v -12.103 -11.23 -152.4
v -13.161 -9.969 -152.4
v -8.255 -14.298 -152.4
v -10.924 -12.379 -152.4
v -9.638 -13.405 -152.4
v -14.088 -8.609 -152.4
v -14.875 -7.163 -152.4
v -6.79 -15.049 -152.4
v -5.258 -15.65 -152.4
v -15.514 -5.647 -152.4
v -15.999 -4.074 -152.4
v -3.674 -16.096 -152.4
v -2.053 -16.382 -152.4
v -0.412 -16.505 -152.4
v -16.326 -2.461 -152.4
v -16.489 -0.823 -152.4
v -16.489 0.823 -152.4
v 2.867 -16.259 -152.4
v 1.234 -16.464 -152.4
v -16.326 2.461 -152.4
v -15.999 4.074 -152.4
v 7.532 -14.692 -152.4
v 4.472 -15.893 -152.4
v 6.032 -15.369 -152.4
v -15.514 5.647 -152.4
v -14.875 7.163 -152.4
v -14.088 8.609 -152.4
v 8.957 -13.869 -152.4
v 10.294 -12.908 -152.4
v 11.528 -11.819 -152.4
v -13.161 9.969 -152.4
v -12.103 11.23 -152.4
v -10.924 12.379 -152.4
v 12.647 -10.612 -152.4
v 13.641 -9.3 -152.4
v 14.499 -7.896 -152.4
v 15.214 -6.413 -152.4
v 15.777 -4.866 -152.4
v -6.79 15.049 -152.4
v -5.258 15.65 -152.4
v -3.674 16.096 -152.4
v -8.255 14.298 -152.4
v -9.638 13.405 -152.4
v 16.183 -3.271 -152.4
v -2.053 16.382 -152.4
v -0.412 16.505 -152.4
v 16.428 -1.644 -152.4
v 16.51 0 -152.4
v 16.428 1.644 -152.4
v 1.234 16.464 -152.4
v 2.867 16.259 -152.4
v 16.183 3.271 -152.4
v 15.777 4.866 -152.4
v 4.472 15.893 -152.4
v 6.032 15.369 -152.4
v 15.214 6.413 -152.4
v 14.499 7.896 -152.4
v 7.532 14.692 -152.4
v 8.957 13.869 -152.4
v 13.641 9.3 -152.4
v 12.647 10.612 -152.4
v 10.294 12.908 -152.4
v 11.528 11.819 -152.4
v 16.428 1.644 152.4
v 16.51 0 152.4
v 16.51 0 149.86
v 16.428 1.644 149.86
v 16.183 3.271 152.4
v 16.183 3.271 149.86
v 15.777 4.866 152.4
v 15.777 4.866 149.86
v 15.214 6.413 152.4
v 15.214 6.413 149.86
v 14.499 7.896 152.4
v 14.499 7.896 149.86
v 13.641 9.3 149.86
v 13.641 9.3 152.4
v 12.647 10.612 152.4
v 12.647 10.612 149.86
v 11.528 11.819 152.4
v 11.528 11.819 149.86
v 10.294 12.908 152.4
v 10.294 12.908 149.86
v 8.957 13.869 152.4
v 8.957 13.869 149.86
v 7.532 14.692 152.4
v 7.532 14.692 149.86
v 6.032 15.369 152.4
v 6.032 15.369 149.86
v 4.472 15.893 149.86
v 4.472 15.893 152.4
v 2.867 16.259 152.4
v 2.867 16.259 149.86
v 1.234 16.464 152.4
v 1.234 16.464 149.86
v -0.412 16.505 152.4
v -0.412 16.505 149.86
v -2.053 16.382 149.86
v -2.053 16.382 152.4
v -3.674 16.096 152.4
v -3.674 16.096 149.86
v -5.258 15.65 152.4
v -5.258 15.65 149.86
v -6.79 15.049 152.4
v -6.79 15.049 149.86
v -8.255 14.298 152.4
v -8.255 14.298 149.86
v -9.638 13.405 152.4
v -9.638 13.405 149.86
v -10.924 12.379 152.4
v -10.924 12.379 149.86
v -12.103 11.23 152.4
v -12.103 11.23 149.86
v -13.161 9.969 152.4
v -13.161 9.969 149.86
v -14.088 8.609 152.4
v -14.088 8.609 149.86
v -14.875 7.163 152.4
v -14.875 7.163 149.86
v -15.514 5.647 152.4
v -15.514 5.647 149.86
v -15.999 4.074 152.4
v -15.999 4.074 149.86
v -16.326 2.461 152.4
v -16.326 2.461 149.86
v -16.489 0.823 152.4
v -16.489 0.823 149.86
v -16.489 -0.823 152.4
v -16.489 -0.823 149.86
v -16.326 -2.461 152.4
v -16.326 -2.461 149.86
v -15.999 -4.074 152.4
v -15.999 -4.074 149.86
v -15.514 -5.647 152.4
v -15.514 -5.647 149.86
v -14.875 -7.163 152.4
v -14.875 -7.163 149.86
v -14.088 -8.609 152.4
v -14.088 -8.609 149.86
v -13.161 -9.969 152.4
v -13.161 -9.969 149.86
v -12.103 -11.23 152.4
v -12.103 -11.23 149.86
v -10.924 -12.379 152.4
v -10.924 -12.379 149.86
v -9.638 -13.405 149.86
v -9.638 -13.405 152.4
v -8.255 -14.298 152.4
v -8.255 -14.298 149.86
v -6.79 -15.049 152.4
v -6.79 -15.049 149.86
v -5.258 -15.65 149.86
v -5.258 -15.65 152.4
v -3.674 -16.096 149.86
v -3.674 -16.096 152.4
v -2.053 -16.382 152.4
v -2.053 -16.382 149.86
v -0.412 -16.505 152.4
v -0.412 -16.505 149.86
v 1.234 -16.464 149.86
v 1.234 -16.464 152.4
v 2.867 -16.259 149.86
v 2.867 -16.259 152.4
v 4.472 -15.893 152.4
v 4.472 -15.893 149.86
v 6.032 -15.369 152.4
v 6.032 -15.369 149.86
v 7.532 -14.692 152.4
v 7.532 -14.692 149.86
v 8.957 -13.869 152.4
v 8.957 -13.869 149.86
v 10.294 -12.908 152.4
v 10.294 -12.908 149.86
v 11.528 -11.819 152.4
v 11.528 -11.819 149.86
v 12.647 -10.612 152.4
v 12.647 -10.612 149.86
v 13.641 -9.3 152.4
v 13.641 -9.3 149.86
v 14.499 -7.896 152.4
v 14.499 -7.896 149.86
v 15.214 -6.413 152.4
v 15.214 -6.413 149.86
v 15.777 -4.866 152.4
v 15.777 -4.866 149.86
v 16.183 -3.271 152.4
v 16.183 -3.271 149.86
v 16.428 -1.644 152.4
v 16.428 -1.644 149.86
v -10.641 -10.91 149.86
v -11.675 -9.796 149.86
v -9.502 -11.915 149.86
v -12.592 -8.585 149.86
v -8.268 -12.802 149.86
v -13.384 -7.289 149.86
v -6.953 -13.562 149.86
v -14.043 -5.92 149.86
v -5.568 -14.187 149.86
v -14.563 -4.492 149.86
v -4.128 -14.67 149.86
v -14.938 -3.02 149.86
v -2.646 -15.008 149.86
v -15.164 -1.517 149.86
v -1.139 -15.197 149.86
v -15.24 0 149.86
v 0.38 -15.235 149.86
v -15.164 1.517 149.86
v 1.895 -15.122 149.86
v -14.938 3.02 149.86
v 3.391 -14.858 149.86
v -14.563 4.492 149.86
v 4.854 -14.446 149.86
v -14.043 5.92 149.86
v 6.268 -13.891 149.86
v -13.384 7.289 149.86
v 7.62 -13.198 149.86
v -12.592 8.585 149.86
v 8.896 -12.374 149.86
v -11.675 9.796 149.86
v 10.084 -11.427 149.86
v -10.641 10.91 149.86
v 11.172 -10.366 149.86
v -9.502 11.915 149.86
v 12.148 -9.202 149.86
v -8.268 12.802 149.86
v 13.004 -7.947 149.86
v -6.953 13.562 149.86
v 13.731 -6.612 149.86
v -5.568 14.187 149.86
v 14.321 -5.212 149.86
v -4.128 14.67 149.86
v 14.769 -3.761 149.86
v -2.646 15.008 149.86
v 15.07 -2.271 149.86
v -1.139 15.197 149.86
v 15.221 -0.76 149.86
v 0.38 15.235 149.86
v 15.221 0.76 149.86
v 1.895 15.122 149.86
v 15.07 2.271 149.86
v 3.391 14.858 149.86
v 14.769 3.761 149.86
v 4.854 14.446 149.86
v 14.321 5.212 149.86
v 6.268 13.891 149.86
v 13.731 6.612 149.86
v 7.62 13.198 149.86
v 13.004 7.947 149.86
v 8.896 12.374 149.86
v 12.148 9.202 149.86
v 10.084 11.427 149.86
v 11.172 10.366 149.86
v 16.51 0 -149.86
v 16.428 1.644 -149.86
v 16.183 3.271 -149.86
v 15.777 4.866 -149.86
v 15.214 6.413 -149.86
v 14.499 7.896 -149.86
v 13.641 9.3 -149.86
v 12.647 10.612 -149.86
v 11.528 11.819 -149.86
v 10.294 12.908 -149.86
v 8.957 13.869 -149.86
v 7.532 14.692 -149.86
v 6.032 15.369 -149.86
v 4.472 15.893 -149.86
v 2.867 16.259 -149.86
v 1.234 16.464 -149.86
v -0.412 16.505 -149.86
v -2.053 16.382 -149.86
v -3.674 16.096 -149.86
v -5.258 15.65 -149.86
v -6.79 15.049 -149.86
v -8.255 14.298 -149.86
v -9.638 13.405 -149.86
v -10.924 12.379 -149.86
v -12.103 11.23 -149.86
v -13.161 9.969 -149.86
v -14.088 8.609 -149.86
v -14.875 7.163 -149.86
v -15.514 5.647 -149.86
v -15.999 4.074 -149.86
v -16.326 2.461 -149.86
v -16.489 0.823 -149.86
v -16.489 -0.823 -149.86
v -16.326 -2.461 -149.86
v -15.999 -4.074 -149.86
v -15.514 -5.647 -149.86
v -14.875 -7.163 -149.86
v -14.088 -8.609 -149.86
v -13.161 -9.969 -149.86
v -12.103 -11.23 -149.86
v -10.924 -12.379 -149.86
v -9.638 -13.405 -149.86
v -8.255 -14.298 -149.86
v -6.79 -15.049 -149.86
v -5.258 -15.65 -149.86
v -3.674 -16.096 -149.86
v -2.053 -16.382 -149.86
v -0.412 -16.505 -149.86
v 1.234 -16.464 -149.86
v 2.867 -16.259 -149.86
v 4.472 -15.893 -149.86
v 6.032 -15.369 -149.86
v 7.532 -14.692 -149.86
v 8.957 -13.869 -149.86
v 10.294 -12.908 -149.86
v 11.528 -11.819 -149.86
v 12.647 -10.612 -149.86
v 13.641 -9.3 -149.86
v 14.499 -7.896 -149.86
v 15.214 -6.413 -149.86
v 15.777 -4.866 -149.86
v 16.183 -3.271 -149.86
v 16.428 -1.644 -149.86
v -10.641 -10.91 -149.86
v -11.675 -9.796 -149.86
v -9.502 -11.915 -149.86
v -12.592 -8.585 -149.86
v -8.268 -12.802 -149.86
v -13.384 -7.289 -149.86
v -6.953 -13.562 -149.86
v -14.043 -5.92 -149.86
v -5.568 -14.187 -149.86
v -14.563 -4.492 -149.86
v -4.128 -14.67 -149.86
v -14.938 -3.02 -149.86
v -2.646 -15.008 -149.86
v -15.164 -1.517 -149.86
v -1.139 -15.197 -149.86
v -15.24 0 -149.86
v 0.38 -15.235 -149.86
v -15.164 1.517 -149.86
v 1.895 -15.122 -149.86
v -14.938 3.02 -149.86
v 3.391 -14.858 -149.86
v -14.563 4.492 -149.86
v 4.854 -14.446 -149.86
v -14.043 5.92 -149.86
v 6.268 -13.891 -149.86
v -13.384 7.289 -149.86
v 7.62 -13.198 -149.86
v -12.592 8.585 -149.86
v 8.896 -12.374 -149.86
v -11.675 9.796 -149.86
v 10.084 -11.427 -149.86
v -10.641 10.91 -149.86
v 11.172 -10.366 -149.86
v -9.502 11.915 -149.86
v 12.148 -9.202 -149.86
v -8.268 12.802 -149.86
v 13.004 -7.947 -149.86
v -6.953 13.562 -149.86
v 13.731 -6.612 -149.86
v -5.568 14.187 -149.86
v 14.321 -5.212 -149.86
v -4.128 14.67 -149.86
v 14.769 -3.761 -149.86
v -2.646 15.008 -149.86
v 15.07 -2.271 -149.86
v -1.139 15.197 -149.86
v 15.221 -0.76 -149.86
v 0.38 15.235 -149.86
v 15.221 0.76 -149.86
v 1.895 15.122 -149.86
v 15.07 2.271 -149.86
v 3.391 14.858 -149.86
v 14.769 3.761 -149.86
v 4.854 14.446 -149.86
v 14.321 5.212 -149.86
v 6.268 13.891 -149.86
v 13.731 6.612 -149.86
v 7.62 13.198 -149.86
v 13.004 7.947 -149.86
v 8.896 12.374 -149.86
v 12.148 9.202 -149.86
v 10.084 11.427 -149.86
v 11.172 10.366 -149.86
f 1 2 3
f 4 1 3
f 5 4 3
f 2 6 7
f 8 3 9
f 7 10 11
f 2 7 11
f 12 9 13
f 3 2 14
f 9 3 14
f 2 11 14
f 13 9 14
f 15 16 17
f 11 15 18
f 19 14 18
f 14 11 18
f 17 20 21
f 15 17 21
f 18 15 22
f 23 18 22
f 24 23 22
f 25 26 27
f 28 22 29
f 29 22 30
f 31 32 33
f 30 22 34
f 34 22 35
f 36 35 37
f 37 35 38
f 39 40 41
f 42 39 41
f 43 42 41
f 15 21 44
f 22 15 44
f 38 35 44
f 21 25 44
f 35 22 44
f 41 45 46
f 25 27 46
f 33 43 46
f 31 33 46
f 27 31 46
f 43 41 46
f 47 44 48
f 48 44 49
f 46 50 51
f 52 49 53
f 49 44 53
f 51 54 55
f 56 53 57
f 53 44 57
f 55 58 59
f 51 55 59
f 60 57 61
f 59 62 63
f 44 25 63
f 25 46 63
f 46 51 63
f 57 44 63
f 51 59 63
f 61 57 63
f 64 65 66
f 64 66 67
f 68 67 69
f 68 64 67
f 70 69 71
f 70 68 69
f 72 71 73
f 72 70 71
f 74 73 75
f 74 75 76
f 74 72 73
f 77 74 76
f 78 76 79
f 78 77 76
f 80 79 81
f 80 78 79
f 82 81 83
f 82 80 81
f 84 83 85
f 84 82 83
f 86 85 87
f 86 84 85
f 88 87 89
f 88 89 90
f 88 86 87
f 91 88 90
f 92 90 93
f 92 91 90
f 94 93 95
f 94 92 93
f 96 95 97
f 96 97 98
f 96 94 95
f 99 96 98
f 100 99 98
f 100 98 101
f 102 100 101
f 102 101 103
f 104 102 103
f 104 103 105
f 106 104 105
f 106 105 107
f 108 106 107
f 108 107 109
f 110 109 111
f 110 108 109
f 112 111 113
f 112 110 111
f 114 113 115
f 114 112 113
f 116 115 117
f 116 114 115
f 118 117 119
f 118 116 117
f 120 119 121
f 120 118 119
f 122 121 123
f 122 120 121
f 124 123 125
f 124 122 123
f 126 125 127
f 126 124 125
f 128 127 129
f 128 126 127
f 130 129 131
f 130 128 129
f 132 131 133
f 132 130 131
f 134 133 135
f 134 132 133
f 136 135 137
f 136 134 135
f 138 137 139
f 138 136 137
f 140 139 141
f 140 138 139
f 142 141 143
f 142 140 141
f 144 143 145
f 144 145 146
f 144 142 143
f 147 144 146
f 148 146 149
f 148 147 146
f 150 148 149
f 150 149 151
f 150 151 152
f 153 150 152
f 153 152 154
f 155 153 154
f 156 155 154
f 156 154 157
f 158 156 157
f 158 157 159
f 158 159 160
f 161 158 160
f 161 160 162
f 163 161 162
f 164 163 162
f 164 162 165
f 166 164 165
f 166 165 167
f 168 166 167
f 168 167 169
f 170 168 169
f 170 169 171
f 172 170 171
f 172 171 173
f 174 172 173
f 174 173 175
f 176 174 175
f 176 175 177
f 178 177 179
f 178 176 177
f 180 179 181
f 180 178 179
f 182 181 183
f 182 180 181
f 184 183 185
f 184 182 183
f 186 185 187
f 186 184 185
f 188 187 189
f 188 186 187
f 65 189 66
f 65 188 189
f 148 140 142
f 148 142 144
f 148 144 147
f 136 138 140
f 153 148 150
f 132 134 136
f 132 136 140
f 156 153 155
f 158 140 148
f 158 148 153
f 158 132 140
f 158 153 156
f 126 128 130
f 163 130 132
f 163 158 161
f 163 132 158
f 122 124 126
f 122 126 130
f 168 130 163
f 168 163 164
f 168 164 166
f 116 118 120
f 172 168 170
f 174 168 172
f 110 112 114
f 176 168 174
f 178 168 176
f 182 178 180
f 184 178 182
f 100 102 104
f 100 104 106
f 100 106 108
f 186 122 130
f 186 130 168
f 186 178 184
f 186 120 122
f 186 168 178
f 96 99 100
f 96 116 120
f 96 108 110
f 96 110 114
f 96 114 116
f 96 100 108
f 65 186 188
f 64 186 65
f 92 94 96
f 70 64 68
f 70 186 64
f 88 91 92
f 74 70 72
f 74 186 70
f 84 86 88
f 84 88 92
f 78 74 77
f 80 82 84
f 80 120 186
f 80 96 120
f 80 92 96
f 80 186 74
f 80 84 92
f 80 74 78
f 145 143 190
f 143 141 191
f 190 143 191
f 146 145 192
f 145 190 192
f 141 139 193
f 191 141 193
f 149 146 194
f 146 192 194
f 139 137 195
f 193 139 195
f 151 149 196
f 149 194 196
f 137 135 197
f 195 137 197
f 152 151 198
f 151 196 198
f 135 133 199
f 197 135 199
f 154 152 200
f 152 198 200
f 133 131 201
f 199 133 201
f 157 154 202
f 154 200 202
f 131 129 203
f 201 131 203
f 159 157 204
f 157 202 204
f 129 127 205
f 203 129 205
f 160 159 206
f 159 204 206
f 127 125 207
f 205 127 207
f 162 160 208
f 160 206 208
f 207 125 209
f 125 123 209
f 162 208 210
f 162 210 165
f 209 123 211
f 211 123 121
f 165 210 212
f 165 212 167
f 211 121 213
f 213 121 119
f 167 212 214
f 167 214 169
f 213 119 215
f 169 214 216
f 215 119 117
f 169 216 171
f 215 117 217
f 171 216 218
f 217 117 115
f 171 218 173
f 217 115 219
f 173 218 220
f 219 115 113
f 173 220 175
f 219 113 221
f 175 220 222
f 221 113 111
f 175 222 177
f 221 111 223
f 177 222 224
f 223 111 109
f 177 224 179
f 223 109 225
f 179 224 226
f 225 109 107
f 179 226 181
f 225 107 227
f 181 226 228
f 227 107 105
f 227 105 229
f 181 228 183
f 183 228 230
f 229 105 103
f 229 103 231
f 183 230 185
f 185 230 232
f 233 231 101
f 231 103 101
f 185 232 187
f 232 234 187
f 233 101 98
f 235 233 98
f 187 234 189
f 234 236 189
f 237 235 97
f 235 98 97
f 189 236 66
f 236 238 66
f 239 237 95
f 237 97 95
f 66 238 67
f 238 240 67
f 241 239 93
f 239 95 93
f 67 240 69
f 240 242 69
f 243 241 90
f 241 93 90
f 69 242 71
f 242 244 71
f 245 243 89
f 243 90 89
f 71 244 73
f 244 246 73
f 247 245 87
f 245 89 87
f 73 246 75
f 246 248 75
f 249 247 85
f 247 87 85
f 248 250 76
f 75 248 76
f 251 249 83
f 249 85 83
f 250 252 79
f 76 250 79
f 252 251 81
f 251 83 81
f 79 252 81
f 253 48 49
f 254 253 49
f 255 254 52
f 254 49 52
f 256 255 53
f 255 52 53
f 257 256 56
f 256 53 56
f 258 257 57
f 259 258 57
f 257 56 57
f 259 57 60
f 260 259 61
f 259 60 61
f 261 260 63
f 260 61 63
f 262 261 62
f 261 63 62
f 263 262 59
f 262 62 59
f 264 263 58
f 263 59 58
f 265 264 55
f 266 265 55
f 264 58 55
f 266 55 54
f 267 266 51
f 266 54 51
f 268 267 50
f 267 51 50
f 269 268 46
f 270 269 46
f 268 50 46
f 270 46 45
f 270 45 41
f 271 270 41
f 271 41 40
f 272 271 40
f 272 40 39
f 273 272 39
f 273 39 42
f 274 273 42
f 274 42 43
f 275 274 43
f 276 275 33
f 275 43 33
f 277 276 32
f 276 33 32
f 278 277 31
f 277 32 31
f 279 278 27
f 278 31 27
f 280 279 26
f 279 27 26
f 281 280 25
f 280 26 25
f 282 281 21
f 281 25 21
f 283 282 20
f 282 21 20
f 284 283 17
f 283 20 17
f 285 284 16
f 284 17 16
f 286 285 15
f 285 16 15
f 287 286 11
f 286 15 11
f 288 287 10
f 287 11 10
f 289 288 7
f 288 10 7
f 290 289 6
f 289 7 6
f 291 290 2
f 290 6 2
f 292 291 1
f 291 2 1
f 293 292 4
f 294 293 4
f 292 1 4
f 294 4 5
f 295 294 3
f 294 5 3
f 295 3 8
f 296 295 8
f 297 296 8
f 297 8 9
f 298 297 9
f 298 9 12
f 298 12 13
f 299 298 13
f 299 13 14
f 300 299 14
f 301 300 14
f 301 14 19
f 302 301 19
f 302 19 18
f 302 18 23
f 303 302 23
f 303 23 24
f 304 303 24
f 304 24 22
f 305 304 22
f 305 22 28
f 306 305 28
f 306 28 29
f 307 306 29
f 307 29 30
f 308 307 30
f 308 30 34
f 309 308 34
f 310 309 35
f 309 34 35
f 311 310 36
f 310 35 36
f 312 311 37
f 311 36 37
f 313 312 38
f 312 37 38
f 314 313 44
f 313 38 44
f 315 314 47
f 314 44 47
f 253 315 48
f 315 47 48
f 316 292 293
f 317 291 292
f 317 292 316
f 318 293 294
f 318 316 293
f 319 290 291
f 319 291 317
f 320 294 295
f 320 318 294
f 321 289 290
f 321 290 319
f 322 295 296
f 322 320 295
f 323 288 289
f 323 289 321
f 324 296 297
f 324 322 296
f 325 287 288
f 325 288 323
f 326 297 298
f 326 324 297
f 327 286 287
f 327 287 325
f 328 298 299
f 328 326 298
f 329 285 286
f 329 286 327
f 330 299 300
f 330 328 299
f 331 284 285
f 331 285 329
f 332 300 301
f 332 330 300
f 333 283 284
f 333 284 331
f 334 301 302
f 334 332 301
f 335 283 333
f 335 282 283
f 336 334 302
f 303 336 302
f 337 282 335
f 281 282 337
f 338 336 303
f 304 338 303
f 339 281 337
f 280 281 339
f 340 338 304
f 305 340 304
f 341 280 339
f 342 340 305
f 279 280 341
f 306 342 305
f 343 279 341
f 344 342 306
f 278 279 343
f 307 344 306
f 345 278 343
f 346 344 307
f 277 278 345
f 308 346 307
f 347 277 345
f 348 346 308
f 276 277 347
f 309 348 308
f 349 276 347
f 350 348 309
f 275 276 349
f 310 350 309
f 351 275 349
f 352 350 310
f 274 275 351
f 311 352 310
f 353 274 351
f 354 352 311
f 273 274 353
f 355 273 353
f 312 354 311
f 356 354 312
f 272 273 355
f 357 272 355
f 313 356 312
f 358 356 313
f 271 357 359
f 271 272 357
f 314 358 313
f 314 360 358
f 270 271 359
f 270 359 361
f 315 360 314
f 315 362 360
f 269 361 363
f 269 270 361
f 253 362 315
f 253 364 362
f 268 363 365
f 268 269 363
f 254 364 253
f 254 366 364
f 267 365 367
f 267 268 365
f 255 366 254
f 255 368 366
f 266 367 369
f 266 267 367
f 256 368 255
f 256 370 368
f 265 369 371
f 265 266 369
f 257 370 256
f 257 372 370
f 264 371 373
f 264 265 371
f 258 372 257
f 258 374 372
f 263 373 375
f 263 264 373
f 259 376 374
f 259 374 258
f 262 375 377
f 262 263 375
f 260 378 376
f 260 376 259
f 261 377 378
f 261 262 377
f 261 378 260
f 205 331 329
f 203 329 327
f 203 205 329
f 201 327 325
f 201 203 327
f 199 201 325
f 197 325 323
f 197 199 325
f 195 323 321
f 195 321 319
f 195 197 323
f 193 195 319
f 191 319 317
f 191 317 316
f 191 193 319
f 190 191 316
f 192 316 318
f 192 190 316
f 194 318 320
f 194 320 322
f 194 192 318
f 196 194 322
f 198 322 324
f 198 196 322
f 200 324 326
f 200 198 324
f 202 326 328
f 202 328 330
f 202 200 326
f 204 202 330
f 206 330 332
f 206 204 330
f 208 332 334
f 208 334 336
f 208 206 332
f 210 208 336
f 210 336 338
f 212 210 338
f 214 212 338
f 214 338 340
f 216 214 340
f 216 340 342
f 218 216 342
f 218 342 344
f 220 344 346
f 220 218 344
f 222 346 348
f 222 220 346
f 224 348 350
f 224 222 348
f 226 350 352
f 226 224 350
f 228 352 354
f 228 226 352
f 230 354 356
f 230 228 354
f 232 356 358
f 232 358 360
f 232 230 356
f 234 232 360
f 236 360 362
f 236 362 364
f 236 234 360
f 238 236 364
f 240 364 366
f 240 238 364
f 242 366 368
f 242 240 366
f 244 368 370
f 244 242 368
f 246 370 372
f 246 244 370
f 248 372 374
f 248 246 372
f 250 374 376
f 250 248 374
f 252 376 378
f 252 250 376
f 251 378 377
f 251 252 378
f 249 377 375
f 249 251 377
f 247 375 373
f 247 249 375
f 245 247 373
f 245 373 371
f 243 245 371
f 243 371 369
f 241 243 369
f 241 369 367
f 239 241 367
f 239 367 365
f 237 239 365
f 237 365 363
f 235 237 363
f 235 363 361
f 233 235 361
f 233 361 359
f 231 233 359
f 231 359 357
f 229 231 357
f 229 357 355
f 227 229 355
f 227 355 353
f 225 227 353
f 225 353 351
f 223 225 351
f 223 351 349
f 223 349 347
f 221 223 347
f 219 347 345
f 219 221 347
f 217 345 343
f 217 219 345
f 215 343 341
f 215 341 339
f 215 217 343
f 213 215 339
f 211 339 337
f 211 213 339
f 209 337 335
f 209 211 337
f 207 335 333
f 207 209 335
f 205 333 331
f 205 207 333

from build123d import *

# Parameters (mm, degrees)
SKETCH1_R           = 15.24
BOSS_EXTRUDE1_DEPTH = 152.4
SKETCH2_R           = 16.51
BOSS_EXTRUDE2_DEPTH = 2.54


with BuildPart() as part:
    # Sketch1 → Boss-Extrude1 (new, symmetric)
    with BuildSketch(Plane.XY):
        with Locations(Location((0, 0, 0), (0, 0, 180))):
            Circle(SKETCH1_R)
    extrude(amount=BOSS_EXTRUDE1_DEPTH, both=True)

    # Sketch2 → Boss-Extrude2 (add)
    with BuildSketch(Plane.XY.offset(152.4)):
        Circle(SKETCH2_R)
    boss_extrude2 = extrude(amount=-BOSS_EXTRUDE2_DEPTH)

    # Mirror1: Boss-Extrude2 across plane
    add(boss_extrude2.mirror(Plane.XY))


solid = part.part
